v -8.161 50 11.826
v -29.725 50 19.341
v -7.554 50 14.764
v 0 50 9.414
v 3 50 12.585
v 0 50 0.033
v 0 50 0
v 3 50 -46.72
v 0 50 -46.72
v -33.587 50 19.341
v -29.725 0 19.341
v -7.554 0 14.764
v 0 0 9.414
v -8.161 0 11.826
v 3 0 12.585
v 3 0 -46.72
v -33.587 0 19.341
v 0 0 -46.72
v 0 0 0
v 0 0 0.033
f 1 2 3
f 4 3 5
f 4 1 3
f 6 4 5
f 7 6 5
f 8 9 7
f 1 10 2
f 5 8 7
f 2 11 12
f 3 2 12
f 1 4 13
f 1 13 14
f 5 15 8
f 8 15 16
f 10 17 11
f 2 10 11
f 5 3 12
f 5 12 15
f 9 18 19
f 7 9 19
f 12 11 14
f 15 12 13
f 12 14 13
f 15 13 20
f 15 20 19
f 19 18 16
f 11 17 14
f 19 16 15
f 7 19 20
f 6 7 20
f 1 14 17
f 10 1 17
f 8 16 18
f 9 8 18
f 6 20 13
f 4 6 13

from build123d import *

# Parameters (mm, degrees)
BOSS_EXTRUDE1_DEPTH = 50


with BuildPart() as part:
    # Sketch1 → Boss-Extrude1 (new body)
    with BuildSketch(Plane(origin=(0, 0, 0), x_dir=(1, 0, 0), z_dir=(0, 1, 0))):
        Polygon((3, 46.72), (0, 46.72), (0, 0), (0.000186337, -0.03343628), (3, 0), align=None)
        Polygon((3, 0), (0.000186337, -0.03343628), (0.000186337, -9.413789645), (-8.16140534, -11.826136958), (-33.586790943, -19.341198123), (-29.724787296, -19.341198123), (-7.554025616, -14.764008615), (3, -12.585113004), align=None)
    extrude(amount=BOSS_EXTRUDE1_DEPTH)


solid = part.part
